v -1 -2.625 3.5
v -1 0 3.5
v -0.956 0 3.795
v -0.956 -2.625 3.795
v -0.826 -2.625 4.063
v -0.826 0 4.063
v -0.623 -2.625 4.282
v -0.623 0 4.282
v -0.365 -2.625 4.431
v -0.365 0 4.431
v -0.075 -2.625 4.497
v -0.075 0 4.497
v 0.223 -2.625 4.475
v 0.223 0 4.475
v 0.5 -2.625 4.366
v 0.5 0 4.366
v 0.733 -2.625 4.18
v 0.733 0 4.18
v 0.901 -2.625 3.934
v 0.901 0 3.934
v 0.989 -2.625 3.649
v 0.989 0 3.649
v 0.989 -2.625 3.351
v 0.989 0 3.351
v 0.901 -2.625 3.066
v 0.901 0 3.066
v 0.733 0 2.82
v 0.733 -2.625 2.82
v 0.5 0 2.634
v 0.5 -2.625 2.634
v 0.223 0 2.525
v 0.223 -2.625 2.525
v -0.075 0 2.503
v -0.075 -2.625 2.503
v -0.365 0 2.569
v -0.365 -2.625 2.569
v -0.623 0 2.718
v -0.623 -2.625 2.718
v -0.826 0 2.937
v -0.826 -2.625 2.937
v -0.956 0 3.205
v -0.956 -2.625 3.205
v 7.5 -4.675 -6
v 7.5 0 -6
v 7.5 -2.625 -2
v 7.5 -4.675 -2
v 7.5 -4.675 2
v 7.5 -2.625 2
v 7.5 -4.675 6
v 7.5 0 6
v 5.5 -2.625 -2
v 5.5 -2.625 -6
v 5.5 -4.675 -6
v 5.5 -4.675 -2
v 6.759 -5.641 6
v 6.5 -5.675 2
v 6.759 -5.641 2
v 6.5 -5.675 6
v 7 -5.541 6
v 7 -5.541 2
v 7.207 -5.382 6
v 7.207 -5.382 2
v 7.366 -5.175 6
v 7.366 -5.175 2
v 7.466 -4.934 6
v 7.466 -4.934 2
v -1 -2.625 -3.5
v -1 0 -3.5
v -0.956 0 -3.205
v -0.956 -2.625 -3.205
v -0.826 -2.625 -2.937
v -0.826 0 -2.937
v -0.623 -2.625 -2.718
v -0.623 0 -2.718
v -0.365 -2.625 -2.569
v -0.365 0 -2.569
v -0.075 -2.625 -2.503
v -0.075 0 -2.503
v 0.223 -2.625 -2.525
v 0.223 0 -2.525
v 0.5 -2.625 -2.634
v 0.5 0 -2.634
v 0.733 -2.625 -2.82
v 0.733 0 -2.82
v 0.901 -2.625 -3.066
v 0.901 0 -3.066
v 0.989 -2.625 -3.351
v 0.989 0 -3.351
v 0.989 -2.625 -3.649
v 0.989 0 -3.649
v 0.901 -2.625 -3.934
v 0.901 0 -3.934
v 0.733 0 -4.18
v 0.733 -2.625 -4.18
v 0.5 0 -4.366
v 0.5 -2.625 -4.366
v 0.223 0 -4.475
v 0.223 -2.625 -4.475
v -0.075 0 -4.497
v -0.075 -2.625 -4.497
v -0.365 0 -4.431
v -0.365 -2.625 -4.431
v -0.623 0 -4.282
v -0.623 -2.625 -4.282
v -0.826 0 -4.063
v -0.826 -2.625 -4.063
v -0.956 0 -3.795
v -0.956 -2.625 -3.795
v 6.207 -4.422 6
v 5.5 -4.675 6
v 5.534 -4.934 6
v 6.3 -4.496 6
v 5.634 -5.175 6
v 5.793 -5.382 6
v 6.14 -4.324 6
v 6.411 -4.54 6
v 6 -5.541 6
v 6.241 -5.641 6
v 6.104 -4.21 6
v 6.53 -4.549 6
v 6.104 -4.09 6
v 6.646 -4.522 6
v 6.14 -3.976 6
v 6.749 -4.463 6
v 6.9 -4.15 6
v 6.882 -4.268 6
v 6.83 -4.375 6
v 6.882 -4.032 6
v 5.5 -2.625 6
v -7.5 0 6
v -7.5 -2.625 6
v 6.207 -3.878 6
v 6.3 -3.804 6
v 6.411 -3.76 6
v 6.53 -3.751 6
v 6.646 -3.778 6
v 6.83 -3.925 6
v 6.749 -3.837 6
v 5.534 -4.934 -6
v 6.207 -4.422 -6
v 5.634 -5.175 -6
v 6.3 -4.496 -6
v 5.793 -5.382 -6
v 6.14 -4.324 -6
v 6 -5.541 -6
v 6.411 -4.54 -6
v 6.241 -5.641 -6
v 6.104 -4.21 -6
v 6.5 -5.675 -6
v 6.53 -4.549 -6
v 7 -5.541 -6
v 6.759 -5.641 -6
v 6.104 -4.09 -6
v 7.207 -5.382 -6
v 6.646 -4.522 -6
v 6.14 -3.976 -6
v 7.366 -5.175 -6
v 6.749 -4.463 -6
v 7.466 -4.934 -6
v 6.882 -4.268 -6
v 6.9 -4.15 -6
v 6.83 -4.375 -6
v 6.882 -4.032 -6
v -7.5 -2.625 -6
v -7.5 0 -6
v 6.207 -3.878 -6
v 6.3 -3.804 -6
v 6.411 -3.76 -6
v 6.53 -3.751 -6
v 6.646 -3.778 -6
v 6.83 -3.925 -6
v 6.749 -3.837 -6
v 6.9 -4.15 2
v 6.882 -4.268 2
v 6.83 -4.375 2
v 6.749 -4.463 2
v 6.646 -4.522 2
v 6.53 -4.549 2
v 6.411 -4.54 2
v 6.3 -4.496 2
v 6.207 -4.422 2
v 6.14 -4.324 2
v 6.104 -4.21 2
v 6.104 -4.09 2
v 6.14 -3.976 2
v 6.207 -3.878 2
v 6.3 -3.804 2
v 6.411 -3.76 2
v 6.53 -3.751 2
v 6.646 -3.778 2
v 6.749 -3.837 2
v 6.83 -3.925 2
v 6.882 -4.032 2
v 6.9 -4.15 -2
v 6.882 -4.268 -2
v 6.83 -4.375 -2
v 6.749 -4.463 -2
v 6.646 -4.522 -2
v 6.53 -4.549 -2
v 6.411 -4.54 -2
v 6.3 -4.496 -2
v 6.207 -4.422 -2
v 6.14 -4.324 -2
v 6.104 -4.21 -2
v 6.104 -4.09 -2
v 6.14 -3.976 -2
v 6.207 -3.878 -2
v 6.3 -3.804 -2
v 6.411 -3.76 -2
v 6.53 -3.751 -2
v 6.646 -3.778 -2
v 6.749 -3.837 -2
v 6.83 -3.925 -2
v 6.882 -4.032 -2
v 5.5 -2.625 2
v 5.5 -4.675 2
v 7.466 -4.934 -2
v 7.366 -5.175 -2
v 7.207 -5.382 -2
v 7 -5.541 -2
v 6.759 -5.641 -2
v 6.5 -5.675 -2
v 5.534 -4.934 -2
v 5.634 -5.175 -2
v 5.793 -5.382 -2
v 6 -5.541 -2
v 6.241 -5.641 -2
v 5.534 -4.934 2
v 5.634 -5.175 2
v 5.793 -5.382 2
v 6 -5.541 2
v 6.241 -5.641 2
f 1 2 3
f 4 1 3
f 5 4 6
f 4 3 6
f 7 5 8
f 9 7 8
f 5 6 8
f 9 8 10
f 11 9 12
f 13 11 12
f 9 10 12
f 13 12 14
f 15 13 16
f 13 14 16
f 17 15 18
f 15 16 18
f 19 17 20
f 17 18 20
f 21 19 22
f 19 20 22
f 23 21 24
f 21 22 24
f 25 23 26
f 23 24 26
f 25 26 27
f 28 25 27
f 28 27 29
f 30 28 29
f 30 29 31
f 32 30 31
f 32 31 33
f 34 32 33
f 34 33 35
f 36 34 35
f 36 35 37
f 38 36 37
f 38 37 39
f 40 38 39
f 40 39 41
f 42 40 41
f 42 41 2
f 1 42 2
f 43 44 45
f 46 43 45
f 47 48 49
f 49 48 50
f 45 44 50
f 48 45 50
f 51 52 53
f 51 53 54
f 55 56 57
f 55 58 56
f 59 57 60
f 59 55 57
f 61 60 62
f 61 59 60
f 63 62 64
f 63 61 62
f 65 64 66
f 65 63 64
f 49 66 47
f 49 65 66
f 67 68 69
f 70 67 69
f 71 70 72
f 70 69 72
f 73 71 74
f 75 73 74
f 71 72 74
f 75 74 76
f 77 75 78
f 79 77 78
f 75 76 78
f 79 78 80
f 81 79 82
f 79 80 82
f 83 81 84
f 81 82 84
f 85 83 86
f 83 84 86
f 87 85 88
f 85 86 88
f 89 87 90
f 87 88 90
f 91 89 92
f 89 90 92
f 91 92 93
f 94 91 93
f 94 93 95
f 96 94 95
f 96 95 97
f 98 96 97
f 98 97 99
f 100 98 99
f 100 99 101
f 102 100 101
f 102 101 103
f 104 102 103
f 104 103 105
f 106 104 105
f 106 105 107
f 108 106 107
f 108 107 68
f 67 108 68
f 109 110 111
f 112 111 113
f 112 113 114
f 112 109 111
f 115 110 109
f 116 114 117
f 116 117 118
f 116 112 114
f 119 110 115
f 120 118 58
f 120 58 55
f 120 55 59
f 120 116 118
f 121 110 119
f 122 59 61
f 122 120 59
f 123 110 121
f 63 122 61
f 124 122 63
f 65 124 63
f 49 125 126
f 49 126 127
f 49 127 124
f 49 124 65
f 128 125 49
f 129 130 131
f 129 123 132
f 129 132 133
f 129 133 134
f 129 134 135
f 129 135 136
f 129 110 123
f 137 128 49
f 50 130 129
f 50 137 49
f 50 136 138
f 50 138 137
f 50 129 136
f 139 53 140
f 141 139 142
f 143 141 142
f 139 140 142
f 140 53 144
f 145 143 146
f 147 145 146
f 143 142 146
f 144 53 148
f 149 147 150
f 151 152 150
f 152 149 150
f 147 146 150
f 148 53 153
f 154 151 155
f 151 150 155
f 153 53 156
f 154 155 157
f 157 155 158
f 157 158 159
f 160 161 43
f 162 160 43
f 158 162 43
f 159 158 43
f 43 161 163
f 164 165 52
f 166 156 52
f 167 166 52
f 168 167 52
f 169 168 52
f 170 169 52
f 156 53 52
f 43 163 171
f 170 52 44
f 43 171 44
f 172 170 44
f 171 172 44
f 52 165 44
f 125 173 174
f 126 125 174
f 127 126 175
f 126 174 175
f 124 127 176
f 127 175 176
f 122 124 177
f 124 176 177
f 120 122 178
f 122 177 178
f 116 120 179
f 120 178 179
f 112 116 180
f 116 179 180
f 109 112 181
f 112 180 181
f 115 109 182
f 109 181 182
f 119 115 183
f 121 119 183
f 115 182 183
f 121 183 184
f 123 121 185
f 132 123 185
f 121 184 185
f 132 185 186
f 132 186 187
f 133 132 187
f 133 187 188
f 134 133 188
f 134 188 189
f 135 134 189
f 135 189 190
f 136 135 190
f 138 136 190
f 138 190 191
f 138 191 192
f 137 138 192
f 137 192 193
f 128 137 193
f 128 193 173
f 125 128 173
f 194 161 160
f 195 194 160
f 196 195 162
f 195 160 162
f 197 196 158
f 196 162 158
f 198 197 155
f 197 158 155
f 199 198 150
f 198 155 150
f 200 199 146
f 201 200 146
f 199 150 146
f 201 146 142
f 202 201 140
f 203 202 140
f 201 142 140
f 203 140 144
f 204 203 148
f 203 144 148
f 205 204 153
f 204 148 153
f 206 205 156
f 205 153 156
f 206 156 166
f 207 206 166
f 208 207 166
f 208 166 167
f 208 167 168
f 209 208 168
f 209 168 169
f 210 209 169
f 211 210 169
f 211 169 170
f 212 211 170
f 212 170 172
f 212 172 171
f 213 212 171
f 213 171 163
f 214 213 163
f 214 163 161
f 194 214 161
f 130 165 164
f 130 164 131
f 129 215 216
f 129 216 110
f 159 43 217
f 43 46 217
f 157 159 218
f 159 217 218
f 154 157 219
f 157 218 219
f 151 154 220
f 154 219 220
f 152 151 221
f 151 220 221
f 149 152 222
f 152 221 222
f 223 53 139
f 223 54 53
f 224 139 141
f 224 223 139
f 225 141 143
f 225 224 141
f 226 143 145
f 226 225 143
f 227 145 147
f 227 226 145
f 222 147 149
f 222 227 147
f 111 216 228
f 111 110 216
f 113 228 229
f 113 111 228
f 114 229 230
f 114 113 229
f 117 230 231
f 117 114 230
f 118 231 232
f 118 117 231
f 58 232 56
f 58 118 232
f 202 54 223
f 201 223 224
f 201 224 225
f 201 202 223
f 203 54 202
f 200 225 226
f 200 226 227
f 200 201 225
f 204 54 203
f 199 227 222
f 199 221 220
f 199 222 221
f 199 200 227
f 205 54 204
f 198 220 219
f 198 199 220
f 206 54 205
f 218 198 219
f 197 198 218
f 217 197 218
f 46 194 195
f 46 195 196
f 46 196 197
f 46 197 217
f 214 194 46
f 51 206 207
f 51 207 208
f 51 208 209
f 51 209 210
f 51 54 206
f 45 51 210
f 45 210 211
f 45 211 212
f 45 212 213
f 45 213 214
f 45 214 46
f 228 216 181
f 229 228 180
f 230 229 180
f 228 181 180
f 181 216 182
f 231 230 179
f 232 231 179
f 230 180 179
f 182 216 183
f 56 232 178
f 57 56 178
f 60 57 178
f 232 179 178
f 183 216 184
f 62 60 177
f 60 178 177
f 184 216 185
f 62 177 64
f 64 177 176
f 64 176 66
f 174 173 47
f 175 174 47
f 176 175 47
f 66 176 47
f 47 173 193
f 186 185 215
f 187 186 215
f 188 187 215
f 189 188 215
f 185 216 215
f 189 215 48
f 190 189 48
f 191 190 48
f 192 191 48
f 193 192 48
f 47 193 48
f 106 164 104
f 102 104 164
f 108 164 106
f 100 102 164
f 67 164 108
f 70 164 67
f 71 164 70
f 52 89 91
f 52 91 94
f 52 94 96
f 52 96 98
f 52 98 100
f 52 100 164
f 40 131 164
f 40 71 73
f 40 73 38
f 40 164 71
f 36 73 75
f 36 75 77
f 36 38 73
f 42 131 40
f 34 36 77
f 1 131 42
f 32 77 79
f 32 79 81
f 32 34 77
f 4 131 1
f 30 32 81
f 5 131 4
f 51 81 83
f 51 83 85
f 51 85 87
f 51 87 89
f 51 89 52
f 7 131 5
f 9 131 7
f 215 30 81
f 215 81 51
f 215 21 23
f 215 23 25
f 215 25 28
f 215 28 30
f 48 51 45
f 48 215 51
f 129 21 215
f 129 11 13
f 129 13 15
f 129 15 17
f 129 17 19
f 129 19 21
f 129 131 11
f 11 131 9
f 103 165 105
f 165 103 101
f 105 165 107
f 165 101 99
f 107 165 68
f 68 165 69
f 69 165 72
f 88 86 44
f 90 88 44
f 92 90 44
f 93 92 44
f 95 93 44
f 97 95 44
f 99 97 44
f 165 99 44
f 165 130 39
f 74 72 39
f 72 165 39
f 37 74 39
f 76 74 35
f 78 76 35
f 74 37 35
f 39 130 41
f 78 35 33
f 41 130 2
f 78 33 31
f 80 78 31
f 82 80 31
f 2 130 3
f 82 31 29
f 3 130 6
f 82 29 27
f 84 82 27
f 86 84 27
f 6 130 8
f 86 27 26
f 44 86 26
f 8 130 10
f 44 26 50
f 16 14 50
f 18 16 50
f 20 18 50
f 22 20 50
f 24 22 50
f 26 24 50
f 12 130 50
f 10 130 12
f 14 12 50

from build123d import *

# Parameters (mm, degrees)
F0_W     = 15
F0_H     = 12
F1_DEPTH = 2.625
F2_W     = 2
F2_H     = 4
F3_DEPTH = 3.05
F4_R     = 0.4
F5_DEPTH = 25
F6_R     = 0.99999
F7_R     = 1
F8_DEPTH = 25


# Not quite as in the source:
# - a fillet or chamfer is up to 0.001 mm smaller than in the source, because OpenCascade refuses the exact size


with BuildPart() as f1:
    # F0 (on Front) → F1 (new body)
    with BuildSketch(Plane.XZ):
        Rectangle(F0_W, F0_H)
    extrude(amount=F1_DEPTH)

    # F2 (on face) → F3 (join)
    with BuildSketch(Plane.XZ.offset(2.625)):
        with Locations((6.5, 4)):
            Rectangle(F2_W, F2_H)
        with Locations((6.5, -4)):
            Rectangle(F2_W, F2_H)
    extrude(amount=F3_DEPTH)

    # F4 (on face) → F5 (cut)
    with BuildSketch(Plane(origin=(0, 0, -6), x_dir=(1, 0, 0), z_dir=(0, 0, -1))):
        with Locations((6.5, 4.15)):
            Circle(F4_R)
    extrude(amount=-F5_DEPTH, mode=Mode.SUBTRACT)

    # F6 (radius 1 in the source; OpenCascade refuses exactly that, so slightly less here)
    f6_edges = [f1.edges().sort_by_distance(p)[0] for p in [
        (7.5, -5.675, 4),
        (5.5, -5.675, 4),
        (7.5, -5.675, -4),
        (5.5, -5.675, -4),
    ]]
    fillet(f6_edges, radius=F6_R)

    # F7 (on face) → F8 (cut)
    with BuildSketch(Plane(origin=(0, 0, 0), x_dir=(-1, 0, 0), z_dir=(0, 1, 0))):
        with Locations((0, 3.5)):
            Circle(F7_R)
        with Locations((0, -3.5)):
            Circle(F7_R)
    extrude(amount=-F8_DEPTH, mode=Mode.SUBTRACT)


solid = f1.part
